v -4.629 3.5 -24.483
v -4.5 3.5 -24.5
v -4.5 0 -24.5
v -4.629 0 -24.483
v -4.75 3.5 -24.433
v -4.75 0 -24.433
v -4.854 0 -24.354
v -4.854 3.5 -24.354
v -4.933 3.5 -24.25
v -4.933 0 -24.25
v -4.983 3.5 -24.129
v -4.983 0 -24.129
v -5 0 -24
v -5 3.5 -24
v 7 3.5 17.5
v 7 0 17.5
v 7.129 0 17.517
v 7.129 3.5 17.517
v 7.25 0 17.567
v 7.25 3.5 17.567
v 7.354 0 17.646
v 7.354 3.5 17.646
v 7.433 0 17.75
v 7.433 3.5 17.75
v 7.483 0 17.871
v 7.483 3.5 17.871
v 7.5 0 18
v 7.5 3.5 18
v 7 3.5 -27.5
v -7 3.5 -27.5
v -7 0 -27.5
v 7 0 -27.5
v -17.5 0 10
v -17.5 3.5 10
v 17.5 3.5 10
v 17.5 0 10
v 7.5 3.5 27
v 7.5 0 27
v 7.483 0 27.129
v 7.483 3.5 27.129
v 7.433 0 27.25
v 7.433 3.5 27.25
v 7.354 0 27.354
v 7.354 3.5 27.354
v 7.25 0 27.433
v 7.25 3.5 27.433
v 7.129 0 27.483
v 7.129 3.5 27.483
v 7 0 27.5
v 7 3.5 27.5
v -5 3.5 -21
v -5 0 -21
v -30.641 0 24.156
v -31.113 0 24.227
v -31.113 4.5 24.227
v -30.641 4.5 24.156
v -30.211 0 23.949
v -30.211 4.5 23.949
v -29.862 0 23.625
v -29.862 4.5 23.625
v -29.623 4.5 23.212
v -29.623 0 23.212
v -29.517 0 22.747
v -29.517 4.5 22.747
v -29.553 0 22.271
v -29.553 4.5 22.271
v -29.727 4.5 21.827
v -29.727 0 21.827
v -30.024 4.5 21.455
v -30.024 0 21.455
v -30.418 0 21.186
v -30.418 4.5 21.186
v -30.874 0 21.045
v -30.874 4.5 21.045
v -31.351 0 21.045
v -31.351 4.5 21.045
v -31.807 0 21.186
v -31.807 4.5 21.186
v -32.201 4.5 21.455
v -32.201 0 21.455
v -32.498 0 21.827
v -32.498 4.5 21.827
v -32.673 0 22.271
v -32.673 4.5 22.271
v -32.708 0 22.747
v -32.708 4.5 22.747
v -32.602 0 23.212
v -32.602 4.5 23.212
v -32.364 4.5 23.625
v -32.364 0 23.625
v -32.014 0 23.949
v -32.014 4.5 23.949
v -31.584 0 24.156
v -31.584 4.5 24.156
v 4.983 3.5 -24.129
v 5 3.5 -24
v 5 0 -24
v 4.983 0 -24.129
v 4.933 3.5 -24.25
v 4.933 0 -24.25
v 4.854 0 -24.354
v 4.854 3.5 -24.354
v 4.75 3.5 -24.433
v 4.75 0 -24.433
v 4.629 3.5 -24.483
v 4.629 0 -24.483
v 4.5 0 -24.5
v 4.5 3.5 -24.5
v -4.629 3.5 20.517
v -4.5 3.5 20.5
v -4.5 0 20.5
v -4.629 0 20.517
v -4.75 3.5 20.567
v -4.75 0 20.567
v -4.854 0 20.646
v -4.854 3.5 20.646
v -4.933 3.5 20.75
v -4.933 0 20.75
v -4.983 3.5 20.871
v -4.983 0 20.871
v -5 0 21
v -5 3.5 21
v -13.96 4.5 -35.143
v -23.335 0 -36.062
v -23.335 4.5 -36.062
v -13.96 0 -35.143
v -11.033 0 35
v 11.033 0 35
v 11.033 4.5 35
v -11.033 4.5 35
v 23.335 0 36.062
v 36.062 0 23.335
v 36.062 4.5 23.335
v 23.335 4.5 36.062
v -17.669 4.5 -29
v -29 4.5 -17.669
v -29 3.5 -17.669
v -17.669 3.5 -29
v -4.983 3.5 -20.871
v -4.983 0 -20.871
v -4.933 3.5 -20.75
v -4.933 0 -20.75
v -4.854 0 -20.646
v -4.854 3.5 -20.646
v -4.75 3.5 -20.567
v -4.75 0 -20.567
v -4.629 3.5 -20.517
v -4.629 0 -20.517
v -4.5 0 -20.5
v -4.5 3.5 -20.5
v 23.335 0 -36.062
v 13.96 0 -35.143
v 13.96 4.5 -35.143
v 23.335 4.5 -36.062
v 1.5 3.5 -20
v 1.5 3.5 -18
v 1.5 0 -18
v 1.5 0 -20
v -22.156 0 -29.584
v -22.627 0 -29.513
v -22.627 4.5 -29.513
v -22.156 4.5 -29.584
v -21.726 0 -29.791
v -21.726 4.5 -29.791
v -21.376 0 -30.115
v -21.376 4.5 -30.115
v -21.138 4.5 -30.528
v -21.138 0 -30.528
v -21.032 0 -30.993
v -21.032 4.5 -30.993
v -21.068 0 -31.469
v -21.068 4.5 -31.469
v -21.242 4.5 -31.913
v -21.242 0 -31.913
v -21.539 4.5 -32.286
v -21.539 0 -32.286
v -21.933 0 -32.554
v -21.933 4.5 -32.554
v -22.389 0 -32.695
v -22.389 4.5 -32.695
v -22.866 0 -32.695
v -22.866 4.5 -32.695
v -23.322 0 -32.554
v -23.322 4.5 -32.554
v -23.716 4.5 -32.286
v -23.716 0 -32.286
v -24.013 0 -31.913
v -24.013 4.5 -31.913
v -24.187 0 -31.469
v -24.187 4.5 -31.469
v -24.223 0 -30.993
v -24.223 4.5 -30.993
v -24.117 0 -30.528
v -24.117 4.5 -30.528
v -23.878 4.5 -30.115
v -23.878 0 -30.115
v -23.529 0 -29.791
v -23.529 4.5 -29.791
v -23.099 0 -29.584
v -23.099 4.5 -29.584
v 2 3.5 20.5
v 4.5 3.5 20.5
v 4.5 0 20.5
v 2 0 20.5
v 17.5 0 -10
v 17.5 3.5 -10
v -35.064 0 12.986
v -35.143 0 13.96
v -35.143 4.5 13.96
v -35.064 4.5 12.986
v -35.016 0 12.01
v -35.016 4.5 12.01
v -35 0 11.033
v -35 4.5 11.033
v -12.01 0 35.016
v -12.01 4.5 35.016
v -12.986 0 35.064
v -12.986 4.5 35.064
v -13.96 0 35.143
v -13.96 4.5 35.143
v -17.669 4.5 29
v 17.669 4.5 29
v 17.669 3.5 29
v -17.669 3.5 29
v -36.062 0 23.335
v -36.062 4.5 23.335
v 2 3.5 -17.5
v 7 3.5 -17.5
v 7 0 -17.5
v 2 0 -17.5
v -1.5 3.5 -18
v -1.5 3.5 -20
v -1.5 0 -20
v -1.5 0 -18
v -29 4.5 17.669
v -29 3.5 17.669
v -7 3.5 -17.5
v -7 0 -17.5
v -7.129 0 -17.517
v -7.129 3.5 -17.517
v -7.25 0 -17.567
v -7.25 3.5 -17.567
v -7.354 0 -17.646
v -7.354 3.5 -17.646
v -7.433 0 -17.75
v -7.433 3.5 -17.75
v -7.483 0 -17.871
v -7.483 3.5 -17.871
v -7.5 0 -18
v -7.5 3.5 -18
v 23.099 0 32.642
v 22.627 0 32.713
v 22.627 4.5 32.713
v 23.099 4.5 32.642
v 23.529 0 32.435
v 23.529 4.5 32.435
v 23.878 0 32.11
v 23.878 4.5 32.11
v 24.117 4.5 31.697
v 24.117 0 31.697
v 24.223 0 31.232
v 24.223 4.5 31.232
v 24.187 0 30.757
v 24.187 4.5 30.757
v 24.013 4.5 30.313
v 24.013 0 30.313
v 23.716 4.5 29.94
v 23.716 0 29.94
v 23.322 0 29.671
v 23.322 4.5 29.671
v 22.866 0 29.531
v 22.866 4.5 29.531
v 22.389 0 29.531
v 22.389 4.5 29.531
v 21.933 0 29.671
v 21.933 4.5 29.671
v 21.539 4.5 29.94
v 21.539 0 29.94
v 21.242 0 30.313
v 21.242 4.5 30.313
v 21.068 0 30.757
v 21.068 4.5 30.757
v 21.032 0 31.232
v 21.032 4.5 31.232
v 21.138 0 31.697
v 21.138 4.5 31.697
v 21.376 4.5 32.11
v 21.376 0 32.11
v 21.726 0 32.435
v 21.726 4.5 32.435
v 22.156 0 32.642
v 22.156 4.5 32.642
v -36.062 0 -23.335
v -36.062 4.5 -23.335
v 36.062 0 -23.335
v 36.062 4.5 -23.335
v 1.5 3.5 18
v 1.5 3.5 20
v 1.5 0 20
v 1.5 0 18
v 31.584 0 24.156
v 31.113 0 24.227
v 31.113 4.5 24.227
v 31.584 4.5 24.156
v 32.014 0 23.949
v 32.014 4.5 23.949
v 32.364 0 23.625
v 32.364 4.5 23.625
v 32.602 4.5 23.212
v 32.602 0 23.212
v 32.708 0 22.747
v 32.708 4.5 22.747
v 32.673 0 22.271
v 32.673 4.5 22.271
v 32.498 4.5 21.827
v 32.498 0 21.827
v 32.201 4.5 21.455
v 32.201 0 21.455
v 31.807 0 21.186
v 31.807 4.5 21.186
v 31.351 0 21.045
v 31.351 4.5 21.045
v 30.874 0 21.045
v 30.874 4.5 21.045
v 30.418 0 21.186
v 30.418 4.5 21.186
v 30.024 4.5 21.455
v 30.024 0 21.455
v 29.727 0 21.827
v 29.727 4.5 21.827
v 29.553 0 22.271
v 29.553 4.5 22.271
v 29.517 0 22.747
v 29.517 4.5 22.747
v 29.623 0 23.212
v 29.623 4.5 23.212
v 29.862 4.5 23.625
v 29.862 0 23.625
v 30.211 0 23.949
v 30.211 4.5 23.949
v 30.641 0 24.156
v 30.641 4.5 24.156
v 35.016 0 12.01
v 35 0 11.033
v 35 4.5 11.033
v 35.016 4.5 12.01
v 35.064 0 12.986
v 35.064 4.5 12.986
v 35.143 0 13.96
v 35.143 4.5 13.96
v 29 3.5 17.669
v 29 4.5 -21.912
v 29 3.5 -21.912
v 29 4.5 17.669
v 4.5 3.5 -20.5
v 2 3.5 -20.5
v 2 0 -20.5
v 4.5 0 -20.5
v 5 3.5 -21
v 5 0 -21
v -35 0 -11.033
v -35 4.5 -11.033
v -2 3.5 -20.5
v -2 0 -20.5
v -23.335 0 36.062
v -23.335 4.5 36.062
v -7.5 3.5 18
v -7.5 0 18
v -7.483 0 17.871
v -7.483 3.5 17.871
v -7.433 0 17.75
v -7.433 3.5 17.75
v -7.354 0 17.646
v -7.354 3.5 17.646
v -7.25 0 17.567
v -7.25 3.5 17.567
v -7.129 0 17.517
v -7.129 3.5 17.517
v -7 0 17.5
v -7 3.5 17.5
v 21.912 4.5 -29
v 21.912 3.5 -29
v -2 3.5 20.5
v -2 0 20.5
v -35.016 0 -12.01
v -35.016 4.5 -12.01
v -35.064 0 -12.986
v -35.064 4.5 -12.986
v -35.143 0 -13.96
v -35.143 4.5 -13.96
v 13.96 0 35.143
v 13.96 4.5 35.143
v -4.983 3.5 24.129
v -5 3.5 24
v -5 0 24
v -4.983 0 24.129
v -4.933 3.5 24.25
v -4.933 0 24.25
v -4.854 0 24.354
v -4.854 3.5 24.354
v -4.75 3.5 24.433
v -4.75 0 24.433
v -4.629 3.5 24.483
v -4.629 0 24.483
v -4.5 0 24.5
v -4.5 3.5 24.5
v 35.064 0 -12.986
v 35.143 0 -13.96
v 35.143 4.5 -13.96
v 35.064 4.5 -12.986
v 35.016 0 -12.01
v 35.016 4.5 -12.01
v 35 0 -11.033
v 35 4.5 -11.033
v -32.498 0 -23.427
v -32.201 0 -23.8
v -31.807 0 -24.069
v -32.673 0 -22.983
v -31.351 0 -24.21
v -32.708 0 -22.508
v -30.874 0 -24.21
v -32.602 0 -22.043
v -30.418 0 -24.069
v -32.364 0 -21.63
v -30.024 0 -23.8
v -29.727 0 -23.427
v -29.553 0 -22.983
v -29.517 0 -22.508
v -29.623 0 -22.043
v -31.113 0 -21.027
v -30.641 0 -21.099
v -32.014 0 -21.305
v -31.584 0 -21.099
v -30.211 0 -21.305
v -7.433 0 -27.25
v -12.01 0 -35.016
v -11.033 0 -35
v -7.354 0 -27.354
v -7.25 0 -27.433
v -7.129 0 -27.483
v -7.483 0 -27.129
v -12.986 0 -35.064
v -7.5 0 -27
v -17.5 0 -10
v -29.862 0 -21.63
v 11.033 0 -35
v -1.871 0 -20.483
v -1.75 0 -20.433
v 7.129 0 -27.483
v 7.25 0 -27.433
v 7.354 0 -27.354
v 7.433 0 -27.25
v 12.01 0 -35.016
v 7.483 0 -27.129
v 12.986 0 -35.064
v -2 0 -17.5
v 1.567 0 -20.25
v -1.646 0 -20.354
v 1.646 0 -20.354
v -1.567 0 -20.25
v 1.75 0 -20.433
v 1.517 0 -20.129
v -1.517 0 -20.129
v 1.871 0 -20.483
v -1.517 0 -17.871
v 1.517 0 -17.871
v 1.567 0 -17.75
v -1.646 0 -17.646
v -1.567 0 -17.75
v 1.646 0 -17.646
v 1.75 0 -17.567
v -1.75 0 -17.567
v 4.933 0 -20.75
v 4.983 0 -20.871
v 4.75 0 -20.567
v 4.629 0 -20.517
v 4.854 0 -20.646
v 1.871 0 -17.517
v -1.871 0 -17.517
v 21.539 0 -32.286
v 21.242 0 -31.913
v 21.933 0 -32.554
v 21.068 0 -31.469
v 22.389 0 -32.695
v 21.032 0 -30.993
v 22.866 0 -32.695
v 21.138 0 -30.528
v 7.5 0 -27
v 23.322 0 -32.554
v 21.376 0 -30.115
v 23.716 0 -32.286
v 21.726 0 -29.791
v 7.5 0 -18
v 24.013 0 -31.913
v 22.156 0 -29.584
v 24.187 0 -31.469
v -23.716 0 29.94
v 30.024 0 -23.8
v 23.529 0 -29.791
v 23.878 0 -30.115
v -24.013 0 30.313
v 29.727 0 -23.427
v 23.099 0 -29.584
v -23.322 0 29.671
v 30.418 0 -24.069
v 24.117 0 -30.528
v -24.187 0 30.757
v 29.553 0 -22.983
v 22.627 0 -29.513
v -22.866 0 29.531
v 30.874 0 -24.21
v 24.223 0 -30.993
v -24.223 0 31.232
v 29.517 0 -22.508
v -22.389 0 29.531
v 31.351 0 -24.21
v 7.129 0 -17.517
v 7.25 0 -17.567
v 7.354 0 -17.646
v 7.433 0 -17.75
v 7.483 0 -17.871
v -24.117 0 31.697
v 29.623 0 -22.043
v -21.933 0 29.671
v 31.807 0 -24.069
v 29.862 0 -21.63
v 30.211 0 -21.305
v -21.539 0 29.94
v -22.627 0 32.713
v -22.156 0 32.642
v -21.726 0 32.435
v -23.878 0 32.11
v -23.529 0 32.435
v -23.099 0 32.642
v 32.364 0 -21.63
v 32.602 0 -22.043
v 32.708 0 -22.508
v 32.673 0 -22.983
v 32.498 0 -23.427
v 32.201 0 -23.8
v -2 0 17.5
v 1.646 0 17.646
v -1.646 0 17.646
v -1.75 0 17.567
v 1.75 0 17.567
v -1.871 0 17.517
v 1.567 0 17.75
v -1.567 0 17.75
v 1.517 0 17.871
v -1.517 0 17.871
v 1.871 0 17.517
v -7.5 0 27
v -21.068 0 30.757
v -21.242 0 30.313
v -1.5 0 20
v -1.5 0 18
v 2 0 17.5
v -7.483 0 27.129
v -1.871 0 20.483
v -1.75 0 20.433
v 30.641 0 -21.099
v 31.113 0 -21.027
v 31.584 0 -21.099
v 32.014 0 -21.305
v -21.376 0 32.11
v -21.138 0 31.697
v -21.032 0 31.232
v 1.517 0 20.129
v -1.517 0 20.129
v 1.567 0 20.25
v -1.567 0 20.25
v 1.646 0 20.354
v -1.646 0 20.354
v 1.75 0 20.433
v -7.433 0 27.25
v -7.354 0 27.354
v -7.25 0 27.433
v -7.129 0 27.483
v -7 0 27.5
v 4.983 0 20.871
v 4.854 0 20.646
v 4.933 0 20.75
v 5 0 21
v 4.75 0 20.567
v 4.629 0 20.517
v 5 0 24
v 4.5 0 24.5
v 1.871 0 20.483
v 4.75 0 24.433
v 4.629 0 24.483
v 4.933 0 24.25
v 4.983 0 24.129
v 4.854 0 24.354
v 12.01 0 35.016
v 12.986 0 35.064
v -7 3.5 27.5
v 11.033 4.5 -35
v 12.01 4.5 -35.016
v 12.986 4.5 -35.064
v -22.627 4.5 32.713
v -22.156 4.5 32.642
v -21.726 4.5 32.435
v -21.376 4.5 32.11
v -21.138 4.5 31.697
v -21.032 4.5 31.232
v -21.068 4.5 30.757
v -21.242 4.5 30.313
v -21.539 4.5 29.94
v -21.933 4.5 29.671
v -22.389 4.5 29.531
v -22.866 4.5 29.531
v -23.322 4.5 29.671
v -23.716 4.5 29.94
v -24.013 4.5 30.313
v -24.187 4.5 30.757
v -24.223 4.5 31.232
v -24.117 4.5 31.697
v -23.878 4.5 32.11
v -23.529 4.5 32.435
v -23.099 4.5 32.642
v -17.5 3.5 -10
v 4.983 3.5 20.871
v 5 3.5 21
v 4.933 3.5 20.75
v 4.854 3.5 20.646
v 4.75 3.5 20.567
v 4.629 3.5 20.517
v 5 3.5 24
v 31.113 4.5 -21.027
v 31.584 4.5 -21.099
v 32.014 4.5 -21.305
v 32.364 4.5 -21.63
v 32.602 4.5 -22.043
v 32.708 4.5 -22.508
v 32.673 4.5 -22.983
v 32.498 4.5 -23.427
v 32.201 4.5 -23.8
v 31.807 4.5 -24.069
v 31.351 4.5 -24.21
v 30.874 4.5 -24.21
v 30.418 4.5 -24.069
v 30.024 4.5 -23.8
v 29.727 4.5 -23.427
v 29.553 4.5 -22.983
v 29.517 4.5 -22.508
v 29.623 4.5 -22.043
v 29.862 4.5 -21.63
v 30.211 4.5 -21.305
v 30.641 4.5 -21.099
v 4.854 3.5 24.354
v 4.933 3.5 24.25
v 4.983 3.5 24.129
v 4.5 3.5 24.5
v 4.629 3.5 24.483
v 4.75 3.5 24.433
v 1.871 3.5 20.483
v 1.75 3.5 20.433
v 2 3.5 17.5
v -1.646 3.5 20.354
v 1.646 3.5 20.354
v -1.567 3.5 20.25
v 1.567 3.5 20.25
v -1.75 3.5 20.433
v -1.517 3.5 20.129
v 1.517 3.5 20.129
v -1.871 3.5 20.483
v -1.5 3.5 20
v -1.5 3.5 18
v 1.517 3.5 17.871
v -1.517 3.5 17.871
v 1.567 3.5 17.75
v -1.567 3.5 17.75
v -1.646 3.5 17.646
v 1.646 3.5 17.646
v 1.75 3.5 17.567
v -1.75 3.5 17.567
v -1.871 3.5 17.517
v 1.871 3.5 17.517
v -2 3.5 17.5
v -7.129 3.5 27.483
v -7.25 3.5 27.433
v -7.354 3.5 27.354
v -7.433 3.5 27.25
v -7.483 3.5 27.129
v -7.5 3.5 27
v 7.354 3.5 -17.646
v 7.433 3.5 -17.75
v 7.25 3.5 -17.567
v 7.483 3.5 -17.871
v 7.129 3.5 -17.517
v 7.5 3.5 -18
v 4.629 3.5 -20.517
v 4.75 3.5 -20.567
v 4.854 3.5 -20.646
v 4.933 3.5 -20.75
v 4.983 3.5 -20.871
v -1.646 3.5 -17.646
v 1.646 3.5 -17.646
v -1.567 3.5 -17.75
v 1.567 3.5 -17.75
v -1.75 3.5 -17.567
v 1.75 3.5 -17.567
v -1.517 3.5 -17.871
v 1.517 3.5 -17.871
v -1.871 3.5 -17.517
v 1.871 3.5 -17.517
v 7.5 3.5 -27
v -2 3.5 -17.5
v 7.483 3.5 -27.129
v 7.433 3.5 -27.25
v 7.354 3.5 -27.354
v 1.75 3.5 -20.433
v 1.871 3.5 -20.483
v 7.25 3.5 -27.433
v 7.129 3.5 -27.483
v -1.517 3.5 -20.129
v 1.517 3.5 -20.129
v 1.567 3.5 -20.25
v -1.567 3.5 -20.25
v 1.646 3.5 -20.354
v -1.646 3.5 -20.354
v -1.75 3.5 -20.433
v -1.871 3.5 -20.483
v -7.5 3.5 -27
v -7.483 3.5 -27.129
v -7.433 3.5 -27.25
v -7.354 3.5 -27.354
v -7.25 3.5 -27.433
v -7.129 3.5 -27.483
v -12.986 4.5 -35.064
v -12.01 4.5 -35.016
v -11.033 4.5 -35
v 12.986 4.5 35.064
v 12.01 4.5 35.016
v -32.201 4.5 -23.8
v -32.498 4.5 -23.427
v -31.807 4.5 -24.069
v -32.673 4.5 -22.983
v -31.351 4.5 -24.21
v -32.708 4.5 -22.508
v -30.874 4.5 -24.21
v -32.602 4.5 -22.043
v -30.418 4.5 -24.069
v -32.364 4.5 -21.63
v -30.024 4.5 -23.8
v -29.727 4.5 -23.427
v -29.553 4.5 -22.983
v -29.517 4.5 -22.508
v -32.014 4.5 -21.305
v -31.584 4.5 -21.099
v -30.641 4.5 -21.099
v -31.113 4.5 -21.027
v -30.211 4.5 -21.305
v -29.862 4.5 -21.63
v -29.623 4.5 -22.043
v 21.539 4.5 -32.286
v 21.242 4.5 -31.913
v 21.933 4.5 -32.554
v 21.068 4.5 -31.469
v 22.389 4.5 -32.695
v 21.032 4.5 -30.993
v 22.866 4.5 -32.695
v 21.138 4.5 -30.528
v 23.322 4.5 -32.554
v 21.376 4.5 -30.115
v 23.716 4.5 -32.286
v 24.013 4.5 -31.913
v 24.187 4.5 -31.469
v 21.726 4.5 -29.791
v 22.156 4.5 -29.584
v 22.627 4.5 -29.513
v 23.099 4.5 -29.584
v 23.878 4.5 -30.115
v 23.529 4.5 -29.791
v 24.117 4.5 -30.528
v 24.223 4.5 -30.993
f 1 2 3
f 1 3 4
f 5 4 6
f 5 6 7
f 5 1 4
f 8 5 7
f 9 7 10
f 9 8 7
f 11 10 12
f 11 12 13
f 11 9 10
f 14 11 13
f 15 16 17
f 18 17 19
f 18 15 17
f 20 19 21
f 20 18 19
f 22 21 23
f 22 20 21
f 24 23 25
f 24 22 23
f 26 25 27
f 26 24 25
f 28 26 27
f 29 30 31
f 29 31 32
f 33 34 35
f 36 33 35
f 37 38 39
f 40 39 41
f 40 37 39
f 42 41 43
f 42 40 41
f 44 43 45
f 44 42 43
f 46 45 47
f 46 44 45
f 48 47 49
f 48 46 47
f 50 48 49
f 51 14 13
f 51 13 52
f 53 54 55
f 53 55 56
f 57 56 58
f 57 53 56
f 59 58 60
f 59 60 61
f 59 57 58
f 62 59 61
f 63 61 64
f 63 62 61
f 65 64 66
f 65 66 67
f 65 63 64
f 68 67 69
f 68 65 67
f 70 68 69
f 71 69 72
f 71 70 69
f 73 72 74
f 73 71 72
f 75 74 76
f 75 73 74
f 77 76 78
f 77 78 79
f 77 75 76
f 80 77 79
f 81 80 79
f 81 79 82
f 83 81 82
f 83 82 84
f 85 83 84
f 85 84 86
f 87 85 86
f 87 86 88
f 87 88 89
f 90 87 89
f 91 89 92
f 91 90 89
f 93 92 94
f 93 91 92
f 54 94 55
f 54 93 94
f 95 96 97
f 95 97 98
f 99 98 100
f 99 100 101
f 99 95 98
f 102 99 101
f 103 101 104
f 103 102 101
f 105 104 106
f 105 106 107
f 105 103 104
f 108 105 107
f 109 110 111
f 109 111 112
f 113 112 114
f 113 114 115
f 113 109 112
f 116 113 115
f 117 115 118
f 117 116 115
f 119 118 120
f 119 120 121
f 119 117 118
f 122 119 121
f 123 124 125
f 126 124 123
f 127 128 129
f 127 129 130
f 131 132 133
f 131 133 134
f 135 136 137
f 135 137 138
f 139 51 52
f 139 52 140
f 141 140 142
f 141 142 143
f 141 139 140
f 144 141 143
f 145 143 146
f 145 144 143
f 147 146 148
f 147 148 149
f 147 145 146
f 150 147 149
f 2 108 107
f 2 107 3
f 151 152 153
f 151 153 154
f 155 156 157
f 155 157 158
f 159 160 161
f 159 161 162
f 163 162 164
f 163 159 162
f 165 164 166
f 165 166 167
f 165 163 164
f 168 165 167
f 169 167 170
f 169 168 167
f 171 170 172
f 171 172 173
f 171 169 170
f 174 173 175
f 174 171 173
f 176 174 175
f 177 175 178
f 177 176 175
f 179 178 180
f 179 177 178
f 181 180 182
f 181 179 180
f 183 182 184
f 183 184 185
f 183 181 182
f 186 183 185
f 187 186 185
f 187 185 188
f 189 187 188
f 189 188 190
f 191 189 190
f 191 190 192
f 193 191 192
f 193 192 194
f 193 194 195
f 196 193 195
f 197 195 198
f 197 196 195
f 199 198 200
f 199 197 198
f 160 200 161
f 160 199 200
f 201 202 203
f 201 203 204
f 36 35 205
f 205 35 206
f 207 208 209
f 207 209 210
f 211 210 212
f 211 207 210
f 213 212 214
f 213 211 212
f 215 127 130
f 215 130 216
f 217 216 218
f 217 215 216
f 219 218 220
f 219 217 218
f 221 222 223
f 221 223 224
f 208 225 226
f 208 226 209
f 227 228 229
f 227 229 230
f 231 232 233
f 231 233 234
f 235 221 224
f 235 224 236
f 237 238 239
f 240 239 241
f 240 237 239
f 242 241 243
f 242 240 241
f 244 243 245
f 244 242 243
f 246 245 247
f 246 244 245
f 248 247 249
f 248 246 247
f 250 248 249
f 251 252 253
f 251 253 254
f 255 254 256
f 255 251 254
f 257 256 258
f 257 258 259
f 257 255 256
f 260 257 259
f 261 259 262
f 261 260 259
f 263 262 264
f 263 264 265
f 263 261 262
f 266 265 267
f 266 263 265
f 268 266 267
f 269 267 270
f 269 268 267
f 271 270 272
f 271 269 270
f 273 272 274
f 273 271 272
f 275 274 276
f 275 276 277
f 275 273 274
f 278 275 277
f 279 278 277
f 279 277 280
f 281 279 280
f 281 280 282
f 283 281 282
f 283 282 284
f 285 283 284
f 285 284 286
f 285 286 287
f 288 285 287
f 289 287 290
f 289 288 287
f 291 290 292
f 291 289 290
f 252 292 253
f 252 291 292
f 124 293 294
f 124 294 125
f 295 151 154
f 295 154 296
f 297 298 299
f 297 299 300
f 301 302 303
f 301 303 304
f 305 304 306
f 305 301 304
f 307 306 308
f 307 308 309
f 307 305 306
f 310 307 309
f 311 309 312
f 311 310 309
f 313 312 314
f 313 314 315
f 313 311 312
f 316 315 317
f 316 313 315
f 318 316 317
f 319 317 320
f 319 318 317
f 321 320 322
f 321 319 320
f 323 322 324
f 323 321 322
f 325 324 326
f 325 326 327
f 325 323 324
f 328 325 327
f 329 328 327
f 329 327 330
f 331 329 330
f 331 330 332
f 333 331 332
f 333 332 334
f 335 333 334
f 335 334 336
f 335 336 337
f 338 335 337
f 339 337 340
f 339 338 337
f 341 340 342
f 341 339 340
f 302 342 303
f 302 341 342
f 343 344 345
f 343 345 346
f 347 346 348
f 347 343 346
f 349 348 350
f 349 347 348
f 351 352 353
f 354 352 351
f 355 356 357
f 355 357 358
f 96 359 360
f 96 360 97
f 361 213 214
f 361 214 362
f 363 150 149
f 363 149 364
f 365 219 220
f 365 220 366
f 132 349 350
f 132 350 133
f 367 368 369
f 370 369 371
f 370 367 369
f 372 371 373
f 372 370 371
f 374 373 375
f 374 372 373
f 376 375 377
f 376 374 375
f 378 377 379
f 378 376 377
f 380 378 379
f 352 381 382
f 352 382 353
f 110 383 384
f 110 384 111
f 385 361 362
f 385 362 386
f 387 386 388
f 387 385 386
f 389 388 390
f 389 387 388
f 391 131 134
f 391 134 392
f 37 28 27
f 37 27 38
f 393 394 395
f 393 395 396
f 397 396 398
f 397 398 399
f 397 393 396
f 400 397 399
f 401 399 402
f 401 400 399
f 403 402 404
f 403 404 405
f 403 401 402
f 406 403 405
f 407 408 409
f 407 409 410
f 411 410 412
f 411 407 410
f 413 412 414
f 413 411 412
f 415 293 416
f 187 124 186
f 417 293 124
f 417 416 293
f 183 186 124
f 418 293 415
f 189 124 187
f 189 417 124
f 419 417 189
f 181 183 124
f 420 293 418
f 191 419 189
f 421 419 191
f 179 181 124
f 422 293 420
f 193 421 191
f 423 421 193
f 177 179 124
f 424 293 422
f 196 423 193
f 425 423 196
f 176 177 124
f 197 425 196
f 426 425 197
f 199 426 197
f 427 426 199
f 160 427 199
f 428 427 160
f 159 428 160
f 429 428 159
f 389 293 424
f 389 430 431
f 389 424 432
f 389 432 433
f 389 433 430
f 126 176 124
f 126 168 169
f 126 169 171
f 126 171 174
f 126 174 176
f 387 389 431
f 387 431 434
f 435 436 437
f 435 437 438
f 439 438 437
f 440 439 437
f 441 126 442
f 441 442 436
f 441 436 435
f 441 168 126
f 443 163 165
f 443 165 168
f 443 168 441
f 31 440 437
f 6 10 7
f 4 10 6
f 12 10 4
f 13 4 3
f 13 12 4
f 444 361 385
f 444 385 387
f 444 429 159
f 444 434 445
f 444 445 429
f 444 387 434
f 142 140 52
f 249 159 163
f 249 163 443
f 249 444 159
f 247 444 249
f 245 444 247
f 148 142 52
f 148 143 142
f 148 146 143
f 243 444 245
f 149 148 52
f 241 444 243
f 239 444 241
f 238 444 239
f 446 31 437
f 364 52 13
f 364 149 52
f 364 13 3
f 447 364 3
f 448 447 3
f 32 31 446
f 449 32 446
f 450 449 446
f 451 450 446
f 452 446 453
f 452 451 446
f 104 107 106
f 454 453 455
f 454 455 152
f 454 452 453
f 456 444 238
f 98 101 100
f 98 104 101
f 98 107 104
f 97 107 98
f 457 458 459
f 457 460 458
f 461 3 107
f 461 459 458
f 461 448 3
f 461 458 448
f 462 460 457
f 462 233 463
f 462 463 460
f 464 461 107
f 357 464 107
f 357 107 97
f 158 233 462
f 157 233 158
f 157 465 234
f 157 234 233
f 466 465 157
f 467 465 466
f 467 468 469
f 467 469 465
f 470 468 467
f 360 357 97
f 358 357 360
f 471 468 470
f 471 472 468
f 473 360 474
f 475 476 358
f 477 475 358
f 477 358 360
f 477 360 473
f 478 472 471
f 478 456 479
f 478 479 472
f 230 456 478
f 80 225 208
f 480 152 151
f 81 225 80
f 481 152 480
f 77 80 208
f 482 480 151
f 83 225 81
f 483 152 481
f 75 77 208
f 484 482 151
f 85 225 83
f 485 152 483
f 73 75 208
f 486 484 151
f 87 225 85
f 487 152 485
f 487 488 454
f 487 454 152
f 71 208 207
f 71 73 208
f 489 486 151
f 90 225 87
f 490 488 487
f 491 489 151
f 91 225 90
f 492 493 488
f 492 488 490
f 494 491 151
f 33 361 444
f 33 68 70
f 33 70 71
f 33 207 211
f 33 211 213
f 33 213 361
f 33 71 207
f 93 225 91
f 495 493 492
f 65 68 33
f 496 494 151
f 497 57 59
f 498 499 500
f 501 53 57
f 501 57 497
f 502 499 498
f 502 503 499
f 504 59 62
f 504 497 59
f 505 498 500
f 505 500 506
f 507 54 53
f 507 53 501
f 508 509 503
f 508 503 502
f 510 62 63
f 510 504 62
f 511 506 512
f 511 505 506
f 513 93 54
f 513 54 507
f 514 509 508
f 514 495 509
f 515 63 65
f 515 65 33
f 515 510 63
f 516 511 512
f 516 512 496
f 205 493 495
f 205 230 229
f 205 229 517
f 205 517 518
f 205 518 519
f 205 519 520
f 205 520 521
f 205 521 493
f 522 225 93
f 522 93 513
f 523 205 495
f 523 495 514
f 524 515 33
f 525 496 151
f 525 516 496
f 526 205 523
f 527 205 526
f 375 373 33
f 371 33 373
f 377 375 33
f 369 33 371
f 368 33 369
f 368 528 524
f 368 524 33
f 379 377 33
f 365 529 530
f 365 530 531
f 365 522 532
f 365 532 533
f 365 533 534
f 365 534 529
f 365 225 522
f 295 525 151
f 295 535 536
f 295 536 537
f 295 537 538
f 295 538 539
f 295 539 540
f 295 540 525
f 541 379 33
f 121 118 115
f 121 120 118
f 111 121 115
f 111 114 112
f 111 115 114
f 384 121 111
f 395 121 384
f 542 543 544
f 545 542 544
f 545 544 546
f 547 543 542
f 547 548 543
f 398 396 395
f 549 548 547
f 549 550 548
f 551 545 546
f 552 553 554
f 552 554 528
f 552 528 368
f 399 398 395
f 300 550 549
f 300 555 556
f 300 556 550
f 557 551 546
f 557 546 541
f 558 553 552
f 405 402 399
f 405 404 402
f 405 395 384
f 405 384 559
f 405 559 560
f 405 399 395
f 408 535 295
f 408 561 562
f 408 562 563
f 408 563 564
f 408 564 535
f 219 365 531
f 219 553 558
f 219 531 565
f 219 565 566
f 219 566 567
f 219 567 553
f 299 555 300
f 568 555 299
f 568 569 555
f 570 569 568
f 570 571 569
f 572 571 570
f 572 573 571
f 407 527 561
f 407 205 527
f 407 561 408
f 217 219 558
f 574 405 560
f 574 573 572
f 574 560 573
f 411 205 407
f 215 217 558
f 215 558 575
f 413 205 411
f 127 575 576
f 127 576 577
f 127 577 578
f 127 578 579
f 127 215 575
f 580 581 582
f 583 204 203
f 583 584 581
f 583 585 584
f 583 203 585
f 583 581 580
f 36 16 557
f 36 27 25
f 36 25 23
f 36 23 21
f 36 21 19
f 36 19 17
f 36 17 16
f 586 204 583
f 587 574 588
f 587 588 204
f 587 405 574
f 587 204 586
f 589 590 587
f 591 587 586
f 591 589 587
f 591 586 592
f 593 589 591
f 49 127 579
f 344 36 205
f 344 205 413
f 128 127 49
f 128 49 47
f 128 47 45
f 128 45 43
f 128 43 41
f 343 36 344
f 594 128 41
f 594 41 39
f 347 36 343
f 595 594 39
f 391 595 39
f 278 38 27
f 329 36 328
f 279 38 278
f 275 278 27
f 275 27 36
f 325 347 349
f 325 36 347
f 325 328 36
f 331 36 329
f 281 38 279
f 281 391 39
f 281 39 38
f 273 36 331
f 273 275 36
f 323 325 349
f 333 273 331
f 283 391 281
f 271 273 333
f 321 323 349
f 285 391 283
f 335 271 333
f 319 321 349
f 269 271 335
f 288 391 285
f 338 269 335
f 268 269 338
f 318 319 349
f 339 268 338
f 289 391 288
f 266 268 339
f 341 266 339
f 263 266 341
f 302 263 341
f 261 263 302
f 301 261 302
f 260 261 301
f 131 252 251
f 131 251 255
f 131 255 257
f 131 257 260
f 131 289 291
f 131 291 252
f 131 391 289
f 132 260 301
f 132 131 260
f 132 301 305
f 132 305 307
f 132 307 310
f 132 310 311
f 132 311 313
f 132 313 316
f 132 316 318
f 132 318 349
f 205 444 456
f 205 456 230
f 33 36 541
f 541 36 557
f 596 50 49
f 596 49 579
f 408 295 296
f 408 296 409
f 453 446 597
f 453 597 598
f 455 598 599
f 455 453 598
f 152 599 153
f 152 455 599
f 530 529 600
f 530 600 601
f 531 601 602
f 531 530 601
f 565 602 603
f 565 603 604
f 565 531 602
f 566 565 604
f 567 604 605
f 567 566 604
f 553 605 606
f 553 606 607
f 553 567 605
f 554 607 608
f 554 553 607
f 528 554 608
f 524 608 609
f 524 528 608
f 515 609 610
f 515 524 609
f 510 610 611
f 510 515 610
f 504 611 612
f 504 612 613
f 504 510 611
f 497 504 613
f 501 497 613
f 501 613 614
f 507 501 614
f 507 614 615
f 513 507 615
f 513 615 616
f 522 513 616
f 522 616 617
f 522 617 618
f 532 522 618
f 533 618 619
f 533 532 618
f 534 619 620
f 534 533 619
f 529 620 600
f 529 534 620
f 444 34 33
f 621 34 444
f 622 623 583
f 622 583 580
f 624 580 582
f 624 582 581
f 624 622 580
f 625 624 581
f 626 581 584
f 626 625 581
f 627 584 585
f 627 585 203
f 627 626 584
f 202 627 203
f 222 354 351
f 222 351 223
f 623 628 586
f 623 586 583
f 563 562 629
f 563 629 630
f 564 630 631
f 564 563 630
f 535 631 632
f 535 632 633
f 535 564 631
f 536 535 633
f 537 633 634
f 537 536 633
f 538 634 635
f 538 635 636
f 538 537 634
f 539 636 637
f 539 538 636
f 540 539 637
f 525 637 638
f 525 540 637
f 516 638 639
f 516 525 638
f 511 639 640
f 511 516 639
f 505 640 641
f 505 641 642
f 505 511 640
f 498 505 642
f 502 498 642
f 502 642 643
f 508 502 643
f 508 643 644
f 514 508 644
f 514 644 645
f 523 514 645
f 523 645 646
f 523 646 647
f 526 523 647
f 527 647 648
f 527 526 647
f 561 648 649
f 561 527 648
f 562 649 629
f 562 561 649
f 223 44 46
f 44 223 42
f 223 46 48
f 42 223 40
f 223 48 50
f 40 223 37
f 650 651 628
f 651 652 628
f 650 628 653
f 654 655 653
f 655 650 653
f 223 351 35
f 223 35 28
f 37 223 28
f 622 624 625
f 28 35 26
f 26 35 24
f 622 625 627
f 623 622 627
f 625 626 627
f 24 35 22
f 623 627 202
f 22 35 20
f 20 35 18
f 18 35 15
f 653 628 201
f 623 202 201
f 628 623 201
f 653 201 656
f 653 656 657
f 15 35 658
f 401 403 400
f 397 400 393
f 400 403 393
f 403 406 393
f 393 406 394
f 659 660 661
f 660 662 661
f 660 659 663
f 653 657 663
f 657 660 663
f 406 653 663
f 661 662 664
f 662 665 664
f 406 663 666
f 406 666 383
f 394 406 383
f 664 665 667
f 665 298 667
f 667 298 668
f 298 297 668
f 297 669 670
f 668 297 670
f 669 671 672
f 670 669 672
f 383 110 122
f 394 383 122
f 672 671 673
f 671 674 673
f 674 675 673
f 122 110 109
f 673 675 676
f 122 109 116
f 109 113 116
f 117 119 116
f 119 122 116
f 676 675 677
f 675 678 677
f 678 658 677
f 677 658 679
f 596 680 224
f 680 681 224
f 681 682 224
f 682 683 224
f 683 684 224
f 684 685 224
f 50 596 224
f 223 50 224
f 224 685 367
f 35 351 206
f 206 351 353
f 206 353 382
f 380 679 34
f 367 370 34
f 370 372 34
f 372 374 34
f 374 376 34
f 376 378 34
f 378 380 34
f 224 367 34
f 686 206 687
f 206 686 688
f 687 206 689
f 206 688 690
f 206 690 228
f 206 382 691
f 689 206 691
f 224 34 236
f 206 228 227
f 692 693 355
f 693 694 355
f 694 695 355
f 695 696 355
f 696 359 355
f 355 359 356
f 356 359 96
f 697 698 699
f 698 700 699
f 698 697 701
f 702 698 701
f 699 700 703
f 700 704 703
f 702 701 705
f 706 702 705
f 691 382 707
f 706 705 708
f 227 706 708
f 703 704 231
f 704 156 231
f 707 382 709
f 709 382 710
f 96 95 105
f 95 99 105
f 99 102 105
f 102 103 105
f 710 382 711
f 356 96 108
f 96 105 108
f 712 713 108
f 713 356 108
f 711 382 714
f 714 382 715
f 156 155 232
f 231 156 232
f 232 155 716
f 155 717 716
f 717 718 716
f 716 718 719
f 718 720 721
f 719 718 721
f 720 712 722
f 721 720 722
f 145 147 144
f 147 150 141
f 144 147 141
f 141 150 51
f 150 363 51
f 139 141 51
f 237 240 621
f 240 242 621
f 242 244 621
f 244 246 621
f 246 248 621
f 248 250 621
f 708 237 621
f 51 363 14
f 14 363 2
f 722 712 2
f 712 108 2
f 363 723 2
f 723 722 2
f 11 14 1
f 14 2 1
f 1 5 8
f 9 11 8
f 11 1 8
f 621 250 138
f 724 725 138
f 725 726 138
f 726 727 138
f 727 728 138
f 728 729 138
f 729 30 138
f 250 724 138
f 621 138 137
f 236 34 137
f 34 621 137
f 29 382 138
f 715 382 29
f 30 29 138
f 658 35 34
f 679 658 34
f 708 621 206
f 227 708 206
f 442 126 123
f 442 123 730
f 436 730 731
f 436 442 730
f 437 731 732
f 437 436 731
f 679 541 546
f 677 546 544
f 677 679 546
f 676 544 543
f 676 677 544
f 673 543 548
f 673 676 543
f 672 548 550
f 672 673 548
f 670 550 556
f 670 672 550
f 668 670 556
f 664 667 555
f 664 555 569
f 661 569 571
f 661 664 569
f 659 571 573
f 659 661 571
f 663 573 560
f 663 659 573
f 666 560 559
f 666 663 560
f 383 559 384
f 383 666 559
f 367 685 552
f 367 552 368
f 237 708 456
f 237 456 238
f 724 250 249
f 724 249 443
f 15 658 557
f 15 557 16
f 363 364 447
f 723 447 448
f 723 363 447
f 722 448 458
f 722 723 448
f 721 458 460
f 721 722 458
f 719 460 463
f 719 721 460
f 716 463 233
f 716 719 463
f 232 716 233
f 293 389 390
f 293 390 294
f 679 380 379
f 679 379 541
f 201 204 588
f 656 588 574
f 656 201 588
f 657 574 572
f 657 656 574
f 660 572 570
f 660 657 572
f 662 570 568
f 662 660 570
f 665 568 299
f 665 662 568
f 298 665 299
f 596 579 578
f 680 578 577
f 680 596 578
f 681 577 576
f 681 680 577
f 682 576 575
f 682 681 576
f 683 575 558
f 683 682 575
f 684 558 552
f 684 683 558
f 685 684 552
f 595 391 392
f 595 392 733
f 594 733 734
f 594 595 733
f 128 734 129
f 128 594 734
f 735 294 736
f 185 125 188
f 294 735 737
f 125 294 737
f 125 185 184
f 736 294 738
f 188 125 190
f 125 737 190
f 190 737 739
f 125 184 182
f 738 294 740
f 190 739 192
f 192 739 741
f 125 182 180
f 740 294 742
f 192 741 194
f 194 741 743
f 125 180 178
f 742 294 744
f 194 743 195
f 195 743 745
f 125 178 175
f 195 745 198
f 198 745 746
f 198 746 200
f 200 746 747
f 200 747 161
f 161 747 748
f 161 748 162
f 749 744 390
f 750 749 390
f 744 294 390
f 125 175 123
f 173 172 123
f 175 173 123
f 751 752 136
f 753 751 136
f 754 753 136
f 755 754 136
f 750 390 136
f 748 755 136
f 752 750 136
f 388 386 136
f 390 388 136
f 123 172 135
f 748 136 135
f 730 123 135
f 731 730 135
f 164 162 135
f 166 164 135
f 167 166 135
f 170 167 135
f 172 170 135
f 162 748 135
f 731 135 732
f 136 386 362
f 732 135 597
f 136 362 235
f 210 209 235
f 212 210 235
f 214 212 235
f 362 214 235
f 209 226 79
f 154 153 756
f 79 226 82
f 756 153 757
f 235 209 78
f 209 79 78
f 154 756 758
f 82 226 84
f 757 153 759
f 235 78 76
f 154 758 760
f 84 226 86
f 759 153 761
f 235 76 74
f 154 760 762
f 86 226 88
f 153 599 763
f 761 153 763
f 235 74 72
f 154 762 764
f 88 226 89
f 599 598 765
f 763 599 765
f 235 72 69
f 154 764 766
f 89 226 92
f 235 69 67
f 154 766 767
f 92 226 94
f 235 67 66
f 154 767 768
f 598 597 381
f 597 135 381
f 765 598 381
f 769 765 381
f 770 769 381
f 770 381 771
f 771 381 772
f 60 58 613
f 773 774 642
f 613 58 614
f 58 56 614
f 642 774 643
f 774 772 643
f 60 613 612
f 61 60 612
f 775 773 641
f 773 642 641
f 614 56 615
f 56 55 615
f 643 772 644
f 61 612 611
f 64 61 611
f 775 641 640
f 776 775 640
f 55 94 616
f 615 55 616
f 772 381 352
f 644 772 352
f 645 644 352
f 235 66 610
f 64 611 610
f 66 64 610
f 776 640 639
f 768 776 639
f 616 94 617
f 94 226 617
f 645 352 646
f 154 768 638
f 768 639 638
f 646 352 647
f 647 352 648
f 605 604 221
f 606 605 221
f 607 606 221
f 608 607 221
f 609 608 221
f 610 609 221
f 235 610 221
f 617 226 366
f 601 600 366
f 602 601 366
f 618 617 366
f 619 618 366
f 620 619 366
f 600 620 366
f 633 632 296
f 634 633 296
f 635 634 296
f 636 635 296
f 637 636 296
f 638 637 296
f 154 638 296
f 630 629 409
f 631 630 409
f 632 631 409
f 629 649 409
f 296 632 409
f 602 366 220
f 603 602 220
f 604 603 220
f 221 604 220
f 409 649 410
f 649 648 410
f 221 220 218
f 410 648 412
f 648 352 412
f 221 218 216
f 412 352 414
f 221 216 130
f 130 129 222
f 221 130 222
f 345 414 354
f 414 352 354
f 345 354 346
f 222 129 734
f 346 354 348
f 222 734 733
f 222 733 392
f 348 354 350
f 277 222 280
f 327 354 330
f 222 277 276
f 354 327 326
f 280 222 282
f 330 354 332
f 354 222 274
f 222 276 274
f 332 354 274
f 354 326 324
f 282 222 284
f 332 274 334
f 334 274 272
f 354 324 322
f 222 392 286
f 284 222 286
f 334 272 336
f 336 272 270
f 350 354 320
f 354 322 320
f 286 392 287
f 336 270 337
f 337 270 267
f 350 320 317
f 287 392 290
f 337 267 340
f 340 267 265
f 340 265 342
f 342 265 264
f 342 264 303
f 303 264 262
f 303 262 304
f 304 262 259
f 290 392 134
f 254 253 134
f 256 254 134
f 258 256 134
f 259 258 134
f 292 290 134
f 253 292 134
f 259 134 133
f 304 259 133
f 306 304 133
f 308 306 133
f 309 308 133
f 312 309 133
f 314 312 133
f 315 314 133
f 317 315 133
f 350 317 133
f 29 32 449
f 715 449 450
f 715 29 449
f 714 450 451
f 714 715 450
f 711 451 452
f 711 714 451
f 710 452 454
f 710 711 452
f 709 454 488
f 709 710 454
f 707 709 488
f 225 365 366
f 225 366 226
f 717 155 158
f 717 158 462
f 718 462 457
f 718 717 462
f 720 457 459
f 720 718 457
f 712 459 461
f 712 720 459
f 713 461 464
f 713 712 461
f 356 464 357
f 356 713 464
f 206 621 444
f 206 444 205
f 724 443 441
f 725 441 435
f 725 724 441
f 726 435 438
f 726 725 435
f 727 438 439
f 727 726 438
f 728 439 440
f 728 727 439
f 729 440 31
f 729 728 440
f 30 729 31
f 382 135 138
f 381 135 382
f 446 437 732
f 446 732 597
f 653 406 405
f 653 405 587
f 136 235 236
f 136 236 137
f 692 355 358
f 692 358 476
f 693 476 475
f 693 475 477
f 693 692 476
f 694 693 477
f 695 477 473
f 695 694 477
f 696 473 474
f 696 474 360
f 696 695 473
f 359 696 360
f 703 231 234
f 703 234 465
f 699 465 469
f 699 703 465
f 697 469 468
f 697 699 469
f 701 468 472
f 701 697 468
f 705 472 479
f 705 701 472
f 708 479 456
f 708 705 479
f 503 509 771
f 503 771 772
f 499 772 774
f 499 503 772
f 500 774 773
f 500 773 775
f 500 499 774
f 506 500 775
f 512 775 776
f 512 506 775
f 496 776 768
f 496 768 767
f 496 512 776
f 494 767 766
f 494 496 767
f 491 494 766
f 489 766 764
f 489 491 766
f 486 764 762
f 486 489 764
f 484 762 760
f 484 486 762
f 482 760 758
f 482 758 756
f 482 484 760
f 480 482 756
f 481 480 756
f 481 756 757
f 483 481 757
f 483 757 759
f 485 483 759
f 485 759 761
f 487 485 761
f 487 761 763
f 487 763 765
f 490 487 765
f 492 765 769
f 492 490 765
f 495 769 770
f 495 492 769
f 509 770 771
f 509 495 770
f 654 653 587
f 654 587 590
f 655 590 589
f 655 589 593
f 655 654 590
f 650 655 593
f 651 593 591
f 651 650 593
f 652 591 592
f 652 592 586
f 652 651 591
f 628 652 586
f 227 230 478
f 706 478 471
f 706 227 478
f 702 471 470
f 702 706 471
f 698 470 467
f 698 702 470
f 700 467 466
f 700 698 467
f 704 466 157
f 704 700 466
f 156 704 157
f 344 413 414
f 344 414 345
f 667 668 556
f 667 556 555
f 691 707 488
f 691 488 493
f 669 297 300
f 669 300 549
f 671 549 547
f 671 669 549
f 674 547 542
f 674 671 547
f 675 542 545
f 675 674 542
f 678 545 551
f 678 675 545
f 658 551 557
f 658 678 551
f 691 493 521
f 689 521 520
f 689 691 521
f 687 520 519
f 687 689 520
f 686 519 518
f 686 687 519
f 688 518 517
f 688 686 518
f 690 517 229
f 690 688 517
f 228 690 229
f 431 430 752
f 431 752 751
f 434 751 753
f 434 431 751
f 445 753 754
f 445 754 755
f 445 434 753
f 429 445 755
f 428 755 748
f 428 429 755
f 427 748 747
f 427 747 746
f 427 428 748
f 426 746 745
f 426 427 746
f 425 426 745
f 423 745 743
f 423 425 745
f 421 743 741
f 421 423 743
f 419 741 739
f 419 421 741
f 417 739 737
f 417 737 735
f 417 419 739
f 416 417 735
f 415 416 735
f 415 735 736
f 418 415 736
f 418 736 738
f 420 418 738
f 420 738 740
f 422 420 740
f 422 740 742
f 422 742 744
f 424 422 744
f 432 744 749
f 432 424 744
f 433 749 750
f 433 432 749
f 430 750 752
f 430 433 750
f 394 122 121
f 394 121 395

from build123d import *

# Parameters (mm, degrees)
SKETCH2_R           = 1.6
BOSS_EXTRUDE1_DEPTH = 4.5
CUT_EXTRUDE1_DEPTH  = 1
FILLET2_R           = 30
CUT_EXTRUDE4_DEPTH  = 52.119956964
SKETCH11_W          = 35
SKETCH11_H          = 20
CUT_EXTRUDE5_DEPTH  = 52.119956964


with BuildPart() as part:
    # Sketch2 → Boss-Extrude1 (new body)
    with BuildSketch(Plane(origin=(0, 0, 0), x_dir=(1, 0, 0), z_dir=(0, 1, 0))):
        Polygon((-12.5, 35), (12.5, 35), (23.334523779, 36.062445841), (36.062445841, 23.334523779), (35, 12.5), (35, -12.5), (36.062445841, -23.334523779), (23.334523779, -36.062445841), (12.5, -35), (-12.5, -35), (-23.334523779, -36.062445841), (-36.062445841, -23.334523779), (-35, -12.5), (-35, 12.5), (-36.062445841, 23.334523779), (-23.334523779, 36.062445841), align=None)
        with Locations(Location((22.627416998, 31.112698372, 0), (0, 0, 270))):
            Circle(SKETCH2_R, mode=Mode.SUBTRACT)
        with Locations(Location((31.112698372, 22.627416998, 0), (0, 0, 270))):
            Circle(SKETCH2_R, mode=Mode.SUBTRACT)
        with Locations(Location((22.627416998, -31.112698372, 0), (0, 0, 270))):
            Circle(SKETCH2_R, mode=Mode.SUBTRACT)
        with Locations(Location((31.112698372, -22.627416998, 0), (0, 0, 270))):
            Circle(SKETCH2_R, mode=Mode.SUBTRACT)
        with Locations(Location((-31.112698372, -22.627416998, 0), (0, 0, 270))):
            Circle(SKETCH2_R, mode=Mode.SUBTRACT)
        with Locations(Location((-22.627416998, -31.112698372, 0), (0, 0, 270))):
            Circle(SKETCH2_R, mode=Mode.SUBTRACT)
        with Locations(Location((-22.627416998, 31.112698372, 0), (0, 0, 270))):
            Circle(SKETCH2_R, mode=Mode.SUBTRACT)
        with Locations(Location((-31.112698372, 22.627416998, 0), (0, 0, 270))):
            Circle(SKETCH2_R, mode=Mode.SUBTRACT)
    extrude(amount=BOSS_EXTRUDE1_DEPTH)

    # Sketch3 → Cut-Extrude1 (cut)
    with BuildSketch(Plane(origin=(0, 4.5, 0), x_dir=(1, 0, 0), z_dir=(0, 1, 0))):
        Polygon((-17.669047558, 29), (21.911688245, 29), (29, 21.911688245), (29, -17.669047558), (17.669047558, -29), (-17.669047558, -29), (-29, -17.669047558), (-29, 17.669047558), align=None)
    extrude(amount=-CUT_EXTRUDE1_DEPTH, mode=Mode.SUBTRACT)

    # Fillet2
    # the kernel refuses this fillet: 30 mm, written as the material it adds along each edge
    with BuildSketch(Plane(origin=(-12.5, 0, -35), x_dir=(1, 0, 0), z_dir=(0, 1, 0))) as fillet2_piece_1:
        with BuildLine():
            CenterArc((FILLET2_R * 0.0489132680018, FILLET2_R), FILLET2_R, 264.399415997, 5.600584003)
            Line((-FILLET2_R * 0.0486797758844, FILLET2_R * 0.00477359471072), (0, 0))
            Line((0, 0), (FILLET2_R * 0.0489132680018, 0))
        make_face()
    extrude(amount=4.5)
    with BuildSketch(Plane(origin=(12.5, 0, -35), x_dir=(-1, 0, 0), z_dir=(0, 1, 0)), Plane(origin=(35, 0, -12.5), x_dir=(0.09759304388620155, 0, -0.9952264052892819), z_dir=(0, 1, 0)), Plane(origin=(35, 0, 12.5), x_dir=(0, 0, -1), z_dir=(0, 1, 0)), Plane(origin=(12.5, 0, 35), x_dir=(0.9952264052892817, 0, 0.09759304388620309), z_dir=(0, 1, 0)), Plane(origin=(-12.5, 0, 35), x_dir=(1, 0, 0), z_dir=(0, 1, 0)), Plane(origin=(-35, 0, 12.5), x_dir=(-0.09759304388619769, 0, 0.9952264052892822), z_dir=(0, 1, 0)), Plane(origin=(-35, 0, -12.5), x_dir=(0, 0, 1), z_dir=(0, 1, 0))) as fillet2_piece_2:
        with BuildLine():
            CenterArc((FILLET2_R * 0.048913268002, -FILLET2_R), FILLET2_R, 90, 5.600584003)
            Line((-FILLET2_R * 0.0486797758846, -FILLET2_R * 0.00477359471075), (0, 0))
            Line((0, 0), (FILLET2_R * 0.048913268002, 0))
        make_face()
    extrude(amount=4.5)

    # Sketch10 → Cut-Extrude4 (cut, through all)
    with BuildSketch(Plane(origin=(0, 3.5, 0), x_dir=(1, 0, 0), z_dir=(0, 1, 0))):
        with BuildLine():
            Line((-1.5, 20), (-1.5, 18))
            ThreePointArc((-1.5, 18), (-1.646446609, 17.646446609), (-2, 17.5))
            Line((-2, 17.5), (-7, 17.5))
            ThreePointArc((-7, 17.5), (-7.353553391, 17.646446609), (-7.5, 18))
            Line((-7.5, 18), (-7.5, 27))
            ThreePointArc((-7.5, 27), (-7.353553391, 27.353553391), (-7, 27.5))
            Line((-7, 27.5), (7, 27.5))
            ThreePointArc((7, 27.5), (7.353553391, 27.353553391), (7.5, 27))
            Line((7.5, 27), (7.5, 18))
            ThreePointArc((7.5, 18), (7.353553391, 17.646446609), (7, 17.5))
            Line((7, 17.5), (2, 17.5))
            ThreePointArc((2, 17.5), (1.646446609, 17.646446609), (1.5, 18))
            Line((1.5, 18), (1.5, 20))
            ThreePointArc((1.5, 20), (1.646446609, 20.353553391), (2, 20.5))
            Line((2, 20.5), (4.5, 20.5))
            ThreePointArc((4.5, 20.5), (4.853553391, 20.646446609), (5, 21))
            Line((5, 21), (5, 24))
            ThreePointArc((5, 24), (4.853553391, 24.353553391), (4.5, 24.5))
            Line((4.5, 24.5), (-4.5, 24.5))
            ThreePointArc((-4.5, 24.5), (-4.853553391, 24.353553391), (-5, 24))
            Line((-5, 24), (-5, 21))
            ThreePointArc((-5, 21), (-4.853553391, 20.646446609), (-4.5, 20.5))
            Line((-4.5, 20.5), (-2, 20.5))
            ThreePointArc((-2, 20.5), (-1.646446609, 20.353553391), (-1.5, 20))
        make_face()
        with BuildLine():
            Line((-2, -20.5), (-4.5, -20.5))
            ThreePointArc((-4.5, -20.5), (-4.853553391, -20.646446609), (-5, -21))
            Line((-5, -21), (-5, -24))
            ThreePointArc((-5, -24), (-4.853553391, -24.353553391), (-4.5, -24.5))
            Line((-4.5, -24.5), (4.5, -24.5))
            ThreePointArc((4.5, -24.5), (4.853553391, -24.353553391), (5, -24))
            Line((5, -24), (5, -21))
            ThreePointArc((5, -21), (4.853553391, -20.646446609), (4.5, -20.5))
            Line((4.5, -20.5), (2, -20.5))
            ThreePointArc((2, -20.5), (1.646446609, -20.353553391), (1.5, -20))
            Line((1.5, -20), (1.5, -18))
            ThreePointArc((1.5, -18), (1.646446609, -17.646446609), (2, -17.5))
            Line((2, -17.5), (7, -17.5))
            ThreePointArc((7, -17.5), (7.353553391, -17.646446609), (7.5, -18))
            Line((7.5, -18), (7.5, -27))
            ThreePointArc((7.5, -27), (7.353553391, -27.353553391), (7, -27.5))
            Line((7, -27.5), (-7, -27.5))
            ThreePointArc((-7, -27.5), (-7.353553391, -27.353553391), (-7.5, -27))
            Line((-7.5, -27), (-7.5, -18))
            ThreePointArc((-7.5, -18), (-7.353553391, -17.646446609), (-7, -17.5))
            Line((-7, -17.5), (-2, -17.5))
            ThreePointArc((-2, -17.5), (-1.646446609, -17.646446609), (-1.5, -18))
            Line((-1.5, -18), (-1.5, -20))
            ThreePointArc((-1.5, -20), (-1.646446609, -20.353553391), (-2, -20.5))
        make_face()
    extrude(amount=-CUT_EXTRUDE4_DEPTH, mode=Mode.SUBTRACT)

    # Sketch11 → Cut-Extrude5 (cut, through all)
    with BuildSketch(Plane(origin=(0, 3.5, 0), x_dir=(1, 0, 0), z_dir=(0, 1, 0))):
        Rectangle(SKETCH11_W, SKETCH11_H)
    extrude(amount=-CUT_EXTRUDE5_DEPTH, mode=Mode.SUBTRACT)


solid = part.part
